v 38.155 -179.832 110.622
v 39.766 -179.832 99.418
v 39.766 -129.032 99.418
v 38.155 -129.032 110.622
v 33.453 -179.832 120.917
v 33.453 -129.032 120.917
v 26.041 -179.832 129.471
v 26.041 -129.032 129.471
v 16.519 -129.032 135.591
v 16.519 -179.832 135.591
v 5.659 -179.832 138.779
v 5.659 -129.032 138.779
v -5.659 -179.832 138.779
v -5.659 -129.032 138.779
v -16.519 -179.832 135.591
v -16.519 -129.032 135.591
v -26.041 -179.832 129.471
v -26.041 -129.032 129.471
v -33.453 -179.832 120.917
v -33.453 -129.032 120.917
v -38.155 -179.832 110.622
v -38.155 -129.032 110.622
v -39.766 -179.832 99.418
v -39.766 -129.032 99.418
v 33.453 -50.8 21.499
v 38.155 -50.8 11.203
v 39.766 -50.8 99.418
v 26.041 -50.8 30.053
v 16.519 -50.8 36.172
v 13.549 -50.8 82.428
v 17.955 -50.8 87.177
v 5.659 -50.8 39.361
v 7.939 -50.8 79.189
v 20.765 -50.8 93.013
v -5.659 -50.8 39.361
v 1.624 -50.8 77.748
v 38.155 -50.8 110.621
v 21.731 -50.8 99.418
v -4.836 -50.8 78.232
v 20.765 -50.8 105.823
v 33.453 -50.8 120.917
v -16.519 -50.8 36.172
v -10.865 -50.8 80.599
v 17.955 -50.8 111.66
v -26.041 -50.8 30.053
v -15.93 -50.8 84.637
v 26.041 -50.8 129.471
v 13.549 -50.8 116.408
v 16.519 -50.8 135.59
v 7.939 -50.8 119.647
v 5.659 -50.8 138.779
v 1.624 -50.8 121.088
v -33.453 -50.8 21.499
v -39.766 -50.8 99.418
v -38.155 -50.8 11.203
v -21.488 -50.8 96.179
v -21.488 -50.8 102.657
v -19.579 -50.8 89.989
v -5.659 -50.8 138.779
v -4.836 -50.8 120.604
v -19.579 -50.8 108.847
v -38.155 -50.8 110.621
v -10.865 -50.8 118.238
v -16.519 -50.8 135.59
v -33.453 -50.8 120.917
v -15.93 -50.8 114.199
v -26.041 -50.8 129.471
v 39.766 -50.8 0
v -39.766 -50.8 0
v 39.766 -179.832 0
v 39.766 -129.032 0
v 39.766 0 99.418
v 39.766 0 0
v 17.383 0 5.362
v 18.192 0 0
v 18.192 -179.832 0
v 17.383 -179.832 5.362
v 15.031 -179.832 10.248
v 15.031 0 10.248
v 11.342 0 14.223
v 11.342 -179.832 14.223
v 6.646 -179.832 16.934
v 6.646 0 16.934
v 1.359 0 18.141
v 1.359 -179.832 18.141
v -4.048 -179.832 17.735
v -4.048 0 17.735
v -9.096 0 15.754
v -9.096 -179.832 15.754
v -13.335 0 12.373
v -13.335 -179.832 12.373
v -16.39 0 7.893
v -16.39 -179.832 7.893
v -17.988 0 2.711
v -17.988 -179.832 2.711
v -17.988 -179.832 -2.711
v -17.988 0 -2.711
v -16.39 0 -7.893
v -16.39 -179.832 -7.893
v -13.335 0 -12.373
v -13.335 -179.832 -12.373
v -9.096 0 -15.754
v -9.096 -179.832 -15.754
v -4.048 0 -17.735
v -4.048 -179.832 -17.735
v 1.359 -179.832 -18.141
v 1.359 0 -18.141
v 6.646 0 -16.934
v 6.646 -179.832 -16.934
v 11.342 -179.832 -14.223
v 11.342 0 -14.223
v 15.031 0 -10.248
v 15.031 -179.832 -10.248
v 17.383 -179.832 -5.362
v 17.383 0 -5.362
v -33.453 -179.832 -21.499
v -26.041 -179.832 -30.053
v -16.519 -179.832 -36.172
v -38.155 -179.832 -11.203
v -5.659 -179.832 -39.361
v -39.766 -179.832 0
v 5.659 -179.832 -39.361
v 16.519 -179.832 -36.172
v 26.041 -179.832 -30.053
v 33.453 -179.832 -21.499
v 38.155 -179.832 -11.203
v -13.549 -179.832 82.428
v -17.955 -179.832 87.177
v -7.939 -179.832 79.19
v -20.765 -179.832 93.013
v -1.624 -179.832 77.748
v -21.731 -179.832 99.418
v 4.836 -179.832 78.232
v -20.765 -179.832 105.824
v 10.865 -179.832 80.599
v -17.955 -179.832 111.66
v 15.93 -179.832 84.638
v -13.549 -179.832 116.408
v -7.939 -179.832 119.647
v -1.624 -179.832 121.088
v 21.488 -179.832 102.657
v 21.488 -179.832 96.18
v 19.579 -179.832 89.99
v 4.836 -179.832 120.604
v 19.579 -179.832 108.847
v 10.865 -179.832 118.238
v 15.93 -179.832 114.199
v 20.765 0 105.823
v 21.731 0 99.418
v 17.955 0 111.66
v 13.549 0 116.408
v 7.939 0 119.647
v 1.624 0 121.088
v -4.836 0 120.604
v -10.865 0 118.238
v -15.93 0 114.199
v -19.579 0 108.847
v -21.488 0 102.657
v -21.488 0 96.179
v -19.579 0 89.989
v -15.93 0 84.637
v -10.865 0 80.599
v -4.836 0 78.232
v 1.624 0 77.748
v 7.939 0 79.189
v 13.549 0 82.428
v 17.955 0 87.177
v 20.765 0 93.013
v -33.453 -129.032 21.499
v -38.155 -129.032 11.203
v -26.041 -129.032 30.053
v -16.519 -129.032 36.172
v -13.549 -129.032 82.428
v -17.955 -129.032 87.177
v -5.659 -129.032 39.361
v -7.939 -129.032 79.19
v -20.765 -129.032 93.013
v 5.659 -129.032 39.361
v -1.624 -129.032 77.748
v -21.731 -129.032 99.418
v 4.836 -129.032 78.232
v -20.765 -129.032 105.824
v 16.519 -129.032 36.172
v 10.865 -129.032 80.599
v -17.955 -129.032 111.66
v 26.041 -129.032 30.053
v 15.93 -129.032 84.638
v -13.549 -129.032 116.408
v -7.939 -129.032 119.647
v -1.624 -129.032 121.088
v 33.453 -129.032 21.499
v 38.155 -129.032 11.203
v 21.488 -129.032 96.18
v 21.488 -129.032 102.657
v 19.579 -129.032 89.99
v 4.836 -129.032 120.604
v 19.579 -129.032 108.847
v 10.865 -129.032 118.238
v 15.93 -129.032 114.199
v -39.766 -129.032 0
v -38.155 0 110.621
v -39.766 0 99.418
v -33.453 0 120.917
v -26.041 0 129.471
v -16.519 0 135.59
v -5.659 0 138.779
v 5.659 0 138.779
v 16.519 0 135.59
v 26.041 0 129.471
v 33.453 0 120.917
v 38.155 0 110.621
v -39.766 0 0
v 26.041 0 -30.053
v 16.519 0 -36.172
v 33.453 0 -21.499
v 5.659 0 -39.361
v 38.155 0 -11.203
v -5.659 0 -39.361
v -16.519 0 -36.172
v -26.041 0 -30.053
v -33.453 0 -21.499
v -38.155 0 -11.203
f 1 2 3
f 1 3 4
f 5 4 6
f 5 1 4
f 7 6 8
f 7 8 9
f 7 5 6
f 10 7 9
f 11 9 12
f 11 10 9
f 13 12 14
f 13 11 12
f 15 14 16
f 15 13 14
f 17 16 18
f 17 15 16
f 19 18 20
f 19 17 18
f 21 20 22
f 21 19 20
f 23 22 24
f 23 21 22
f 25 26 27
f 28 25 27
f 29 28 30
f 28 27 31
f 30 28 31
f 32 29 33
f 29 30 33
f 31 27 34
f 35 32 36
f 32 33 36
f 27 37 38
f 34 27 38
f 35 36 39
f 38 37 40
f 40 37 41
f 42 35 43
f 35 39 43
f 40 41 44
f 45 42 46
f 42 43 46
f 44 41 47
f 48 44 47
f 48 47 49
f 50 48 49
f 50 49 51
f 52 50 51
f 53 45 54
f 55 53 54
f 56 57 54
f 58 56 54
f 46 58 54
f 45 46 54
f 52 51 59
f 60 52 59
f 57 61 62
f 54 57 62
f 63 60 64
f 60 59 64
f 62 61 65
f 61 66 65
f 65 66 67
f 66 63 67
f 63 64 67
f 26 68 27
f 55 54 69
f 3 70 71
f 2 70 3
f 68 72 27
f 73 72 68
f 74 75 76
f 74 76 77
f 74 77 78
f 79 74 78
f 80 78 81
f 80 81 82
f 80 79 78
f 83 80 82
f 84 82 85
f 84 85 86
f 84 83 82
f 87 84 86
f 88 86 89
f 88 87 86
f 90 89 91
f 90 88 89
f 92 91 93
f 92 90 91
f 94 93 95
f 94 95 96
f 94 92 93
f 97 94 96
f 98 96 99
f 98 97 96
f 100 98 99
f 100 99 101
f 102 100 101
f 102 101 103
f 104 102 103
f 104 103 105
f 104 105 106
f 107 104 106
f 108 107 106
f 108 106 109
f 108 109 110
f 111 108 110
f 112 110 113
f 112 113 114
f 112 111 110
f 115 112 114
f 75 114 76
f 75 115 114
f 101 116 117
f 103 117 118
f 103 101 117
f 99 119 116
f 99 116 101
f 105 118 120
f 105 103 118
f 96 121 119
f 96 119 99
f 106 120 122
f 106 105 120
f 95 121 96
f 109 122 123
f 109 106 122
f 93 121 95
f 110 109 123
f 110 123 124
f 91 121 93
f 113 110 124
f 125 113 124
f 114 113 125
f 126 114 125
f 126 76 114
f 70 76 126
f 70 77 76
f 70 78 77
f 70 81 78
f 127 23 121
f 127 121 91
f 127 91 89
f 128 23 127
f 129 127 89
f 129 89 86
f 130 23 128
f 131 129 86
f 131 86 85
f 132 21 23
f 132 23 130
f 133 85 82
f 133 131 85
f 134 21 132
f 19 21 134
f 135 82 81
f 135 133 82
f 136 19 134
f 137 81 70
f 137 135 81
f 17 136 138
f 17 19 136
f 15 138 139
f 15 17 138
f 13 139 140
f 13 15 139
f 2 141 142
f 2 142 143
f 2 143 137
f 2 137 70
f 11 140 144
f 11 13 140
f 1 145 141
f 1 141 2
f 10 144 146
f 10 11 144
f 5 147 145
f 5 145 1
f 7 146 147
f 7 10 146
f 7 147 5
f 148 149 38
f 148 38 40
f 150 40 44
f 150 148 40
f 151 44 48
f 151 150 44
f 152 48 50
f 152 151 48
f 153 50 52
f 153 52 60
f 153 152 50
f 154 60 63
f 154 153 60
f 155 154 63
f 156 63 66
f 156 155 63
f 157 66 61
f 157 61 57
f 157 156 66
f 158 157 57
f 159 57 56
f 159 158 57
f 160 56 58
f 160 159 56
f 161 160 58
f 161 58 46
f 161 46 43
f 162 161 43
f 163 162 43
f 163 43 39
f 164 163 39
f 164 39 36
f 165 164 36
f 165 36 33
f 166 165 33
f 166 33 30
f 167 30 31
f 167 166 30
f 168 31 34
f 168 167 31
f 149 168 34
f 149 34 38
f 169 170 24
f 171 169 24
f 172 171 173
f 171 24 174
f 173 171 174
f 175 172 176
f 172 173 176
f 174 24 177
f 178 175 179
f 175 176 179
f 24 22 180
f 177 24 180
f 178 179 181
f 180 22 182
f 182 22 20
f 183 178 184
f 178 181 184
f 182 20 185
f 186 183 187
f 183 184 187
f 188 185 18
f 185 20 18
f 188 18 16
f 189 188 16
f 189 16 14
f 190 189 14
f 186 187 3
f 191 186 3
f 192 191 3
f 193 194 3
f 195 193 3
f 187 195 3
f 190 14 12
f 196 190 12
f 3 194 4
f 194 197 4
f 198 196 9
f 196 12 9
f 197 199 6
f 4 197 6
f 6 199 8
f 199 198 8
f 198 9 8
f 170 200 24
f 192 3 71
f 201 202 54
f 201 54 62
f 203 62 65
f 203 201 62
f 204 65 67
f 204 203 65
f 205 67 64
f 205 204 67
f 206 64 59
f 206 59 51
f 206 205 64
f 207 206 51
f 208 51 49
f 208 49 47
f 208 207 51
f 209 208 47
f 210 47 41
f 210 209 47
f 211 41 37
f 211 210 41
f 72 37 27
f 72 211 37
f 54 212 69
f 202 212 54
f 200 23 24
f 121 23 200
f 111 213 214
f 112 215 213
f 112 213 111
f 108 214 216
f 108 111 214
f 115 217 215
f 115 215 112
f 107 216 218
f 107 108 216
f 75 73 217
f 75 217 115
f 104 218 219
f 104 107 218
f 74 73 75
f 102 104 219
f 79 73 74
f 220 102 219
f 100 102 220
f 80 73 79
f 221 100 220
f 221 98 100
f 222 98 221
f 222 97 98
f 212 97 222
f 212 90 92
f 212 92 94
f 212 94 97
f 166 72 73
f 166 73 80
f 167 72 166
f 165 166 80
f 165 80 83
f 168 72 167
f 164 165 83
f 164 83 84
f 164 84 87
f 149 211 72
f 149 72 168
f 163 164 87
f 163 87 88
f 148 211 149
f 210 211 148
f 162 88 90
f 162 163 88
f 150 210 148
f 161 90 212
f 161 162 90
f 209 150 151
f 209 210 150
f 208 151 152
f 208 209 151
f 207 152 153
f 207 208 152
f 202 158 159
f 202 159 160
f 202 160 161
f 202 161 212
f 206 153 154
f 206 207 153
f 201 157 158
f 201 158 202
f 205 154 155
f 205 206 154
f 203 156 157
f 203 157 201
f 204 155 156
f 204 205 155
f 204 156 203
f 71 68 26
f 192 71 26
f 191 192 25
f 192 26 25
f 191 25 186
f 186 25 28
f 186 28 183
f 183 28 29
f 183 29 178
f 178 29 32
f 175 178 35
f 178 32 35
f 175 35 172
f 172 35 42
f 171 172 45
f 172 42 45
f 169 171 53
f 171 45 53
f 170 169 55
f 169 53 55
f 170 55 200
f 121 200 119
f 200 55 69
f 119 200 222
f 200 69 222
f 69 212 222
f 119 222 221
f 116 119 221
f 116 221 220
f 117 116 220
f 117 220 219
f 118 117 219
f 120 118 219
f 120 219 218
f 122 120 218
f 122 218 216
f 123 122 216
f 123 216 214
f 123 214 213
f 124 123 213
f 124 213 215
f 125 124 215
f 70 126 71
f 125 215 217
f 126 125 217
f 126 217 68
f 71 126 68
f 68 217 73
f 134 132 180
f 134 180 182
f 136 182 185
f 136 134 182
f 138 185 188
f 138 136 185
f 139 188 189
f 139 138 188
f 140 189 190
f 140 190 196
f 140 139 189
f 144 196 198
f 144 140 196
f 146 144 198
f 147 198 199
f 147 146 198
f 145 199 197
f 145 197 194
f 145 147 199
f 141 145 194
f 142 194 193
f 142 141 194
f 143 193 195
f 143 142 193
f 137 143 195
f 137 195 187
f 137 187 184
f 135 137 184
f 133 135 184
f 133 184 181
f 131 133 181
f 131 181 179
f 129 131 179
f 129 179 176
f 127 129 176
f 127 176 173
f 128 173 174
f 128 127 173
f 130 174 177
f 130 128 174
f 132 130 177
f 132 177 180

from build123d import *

# Parameters (mm, degrees)
F0_R     = 39.76573
F0_R_2   = 18.191508
F1_DEPTH = 179.832
F4_DEPTH = 50.8
F5_DEPTH = 50.8


with BuildPart() as f1:
    # F0 (on Front) → F1 (new body)
    with BuildSketch(Plane.XZ):
        Circle(F0_R)
        Circle(F0_R_2, mode=Mode.SUBTRACT)
    extrude(amount=F1_DEPTH)

    # F3 (on face) → F4 (join)
    with BuildSketch(Plane(origin=(0, 0, 0), x_dir=(-1, 0, 0), z_dir=(0, 1, 0))):
        with BuildLine():
            Line((-39.76573, 99.41814), (-39.76573, 0))
            ThreePointArc((-39.76573, 0), (0, 39.76573), (39.76573, 0))
            Line((39.76573, 0), (39.76573, 99.41814))
            Line((39.76573, 99.41814), (21.730875, 99.41814))
            ThreePointArc((21.730875, 99.41814), (0, 77.687265), (-21.730875, 99.41814))
            Line((-21.730875, 99.41814), (-39.76573, 99.41814))
        make_face()
        with BuildLine():
            ThreePointArc((39.76573, 99.41814), (0, 139.18387), (-39.76573, 99.41814))
            Line((-39.76573, 99.41814), (-21.730875, 99.41814))
            ThreePointArc((-21.730875, 99.41814), (0, 121.149015), (21.730875, 99.41814))
            Line((21.730875, 99.41814), (39.76573, 99.41814))
        make_face()
    extrude(amount=-F4_DEPTH)

    # F2 (on face) → F5 (join)
    with BuildSketch(Plane.XZ.offset(179.832)):
        with BuildLine():
            Line((-39.76573, 99.418327), (-39.76573, 0))
            ThreePointArc((-39.76573, 0), (0, 39.76573), (39.76573, 0))
            Line((39.76573, 0), (39.76573, 99.418327))
            Line((39.76573, 99.418327), (21.730875, 99.418327))
            ThreePointArc((21.730875, 99.418327), (0, 77.687452), (-21.730875, 99.418327))
            Line((-21.730875, 99.418327), (-39.76573, 99.418327))
        make_face()
        with BuildLine():
            ThreePointArc((39.76573, 99.418327), (0, 139.184057), (-39.76573, 99.418327))
            Line((-39.76573, 99.418327), (-21.730875, 99.418327))
            ThreePointArc((-21.730875, 99.418327), (0, 121.149202), (21.730875, 99.418327))
            Line((21.730875, 99.418327), (39.76573, 99.418327))
        make_face()
    extrude(amount=-F5_DEPTH)


solid = f1.part
